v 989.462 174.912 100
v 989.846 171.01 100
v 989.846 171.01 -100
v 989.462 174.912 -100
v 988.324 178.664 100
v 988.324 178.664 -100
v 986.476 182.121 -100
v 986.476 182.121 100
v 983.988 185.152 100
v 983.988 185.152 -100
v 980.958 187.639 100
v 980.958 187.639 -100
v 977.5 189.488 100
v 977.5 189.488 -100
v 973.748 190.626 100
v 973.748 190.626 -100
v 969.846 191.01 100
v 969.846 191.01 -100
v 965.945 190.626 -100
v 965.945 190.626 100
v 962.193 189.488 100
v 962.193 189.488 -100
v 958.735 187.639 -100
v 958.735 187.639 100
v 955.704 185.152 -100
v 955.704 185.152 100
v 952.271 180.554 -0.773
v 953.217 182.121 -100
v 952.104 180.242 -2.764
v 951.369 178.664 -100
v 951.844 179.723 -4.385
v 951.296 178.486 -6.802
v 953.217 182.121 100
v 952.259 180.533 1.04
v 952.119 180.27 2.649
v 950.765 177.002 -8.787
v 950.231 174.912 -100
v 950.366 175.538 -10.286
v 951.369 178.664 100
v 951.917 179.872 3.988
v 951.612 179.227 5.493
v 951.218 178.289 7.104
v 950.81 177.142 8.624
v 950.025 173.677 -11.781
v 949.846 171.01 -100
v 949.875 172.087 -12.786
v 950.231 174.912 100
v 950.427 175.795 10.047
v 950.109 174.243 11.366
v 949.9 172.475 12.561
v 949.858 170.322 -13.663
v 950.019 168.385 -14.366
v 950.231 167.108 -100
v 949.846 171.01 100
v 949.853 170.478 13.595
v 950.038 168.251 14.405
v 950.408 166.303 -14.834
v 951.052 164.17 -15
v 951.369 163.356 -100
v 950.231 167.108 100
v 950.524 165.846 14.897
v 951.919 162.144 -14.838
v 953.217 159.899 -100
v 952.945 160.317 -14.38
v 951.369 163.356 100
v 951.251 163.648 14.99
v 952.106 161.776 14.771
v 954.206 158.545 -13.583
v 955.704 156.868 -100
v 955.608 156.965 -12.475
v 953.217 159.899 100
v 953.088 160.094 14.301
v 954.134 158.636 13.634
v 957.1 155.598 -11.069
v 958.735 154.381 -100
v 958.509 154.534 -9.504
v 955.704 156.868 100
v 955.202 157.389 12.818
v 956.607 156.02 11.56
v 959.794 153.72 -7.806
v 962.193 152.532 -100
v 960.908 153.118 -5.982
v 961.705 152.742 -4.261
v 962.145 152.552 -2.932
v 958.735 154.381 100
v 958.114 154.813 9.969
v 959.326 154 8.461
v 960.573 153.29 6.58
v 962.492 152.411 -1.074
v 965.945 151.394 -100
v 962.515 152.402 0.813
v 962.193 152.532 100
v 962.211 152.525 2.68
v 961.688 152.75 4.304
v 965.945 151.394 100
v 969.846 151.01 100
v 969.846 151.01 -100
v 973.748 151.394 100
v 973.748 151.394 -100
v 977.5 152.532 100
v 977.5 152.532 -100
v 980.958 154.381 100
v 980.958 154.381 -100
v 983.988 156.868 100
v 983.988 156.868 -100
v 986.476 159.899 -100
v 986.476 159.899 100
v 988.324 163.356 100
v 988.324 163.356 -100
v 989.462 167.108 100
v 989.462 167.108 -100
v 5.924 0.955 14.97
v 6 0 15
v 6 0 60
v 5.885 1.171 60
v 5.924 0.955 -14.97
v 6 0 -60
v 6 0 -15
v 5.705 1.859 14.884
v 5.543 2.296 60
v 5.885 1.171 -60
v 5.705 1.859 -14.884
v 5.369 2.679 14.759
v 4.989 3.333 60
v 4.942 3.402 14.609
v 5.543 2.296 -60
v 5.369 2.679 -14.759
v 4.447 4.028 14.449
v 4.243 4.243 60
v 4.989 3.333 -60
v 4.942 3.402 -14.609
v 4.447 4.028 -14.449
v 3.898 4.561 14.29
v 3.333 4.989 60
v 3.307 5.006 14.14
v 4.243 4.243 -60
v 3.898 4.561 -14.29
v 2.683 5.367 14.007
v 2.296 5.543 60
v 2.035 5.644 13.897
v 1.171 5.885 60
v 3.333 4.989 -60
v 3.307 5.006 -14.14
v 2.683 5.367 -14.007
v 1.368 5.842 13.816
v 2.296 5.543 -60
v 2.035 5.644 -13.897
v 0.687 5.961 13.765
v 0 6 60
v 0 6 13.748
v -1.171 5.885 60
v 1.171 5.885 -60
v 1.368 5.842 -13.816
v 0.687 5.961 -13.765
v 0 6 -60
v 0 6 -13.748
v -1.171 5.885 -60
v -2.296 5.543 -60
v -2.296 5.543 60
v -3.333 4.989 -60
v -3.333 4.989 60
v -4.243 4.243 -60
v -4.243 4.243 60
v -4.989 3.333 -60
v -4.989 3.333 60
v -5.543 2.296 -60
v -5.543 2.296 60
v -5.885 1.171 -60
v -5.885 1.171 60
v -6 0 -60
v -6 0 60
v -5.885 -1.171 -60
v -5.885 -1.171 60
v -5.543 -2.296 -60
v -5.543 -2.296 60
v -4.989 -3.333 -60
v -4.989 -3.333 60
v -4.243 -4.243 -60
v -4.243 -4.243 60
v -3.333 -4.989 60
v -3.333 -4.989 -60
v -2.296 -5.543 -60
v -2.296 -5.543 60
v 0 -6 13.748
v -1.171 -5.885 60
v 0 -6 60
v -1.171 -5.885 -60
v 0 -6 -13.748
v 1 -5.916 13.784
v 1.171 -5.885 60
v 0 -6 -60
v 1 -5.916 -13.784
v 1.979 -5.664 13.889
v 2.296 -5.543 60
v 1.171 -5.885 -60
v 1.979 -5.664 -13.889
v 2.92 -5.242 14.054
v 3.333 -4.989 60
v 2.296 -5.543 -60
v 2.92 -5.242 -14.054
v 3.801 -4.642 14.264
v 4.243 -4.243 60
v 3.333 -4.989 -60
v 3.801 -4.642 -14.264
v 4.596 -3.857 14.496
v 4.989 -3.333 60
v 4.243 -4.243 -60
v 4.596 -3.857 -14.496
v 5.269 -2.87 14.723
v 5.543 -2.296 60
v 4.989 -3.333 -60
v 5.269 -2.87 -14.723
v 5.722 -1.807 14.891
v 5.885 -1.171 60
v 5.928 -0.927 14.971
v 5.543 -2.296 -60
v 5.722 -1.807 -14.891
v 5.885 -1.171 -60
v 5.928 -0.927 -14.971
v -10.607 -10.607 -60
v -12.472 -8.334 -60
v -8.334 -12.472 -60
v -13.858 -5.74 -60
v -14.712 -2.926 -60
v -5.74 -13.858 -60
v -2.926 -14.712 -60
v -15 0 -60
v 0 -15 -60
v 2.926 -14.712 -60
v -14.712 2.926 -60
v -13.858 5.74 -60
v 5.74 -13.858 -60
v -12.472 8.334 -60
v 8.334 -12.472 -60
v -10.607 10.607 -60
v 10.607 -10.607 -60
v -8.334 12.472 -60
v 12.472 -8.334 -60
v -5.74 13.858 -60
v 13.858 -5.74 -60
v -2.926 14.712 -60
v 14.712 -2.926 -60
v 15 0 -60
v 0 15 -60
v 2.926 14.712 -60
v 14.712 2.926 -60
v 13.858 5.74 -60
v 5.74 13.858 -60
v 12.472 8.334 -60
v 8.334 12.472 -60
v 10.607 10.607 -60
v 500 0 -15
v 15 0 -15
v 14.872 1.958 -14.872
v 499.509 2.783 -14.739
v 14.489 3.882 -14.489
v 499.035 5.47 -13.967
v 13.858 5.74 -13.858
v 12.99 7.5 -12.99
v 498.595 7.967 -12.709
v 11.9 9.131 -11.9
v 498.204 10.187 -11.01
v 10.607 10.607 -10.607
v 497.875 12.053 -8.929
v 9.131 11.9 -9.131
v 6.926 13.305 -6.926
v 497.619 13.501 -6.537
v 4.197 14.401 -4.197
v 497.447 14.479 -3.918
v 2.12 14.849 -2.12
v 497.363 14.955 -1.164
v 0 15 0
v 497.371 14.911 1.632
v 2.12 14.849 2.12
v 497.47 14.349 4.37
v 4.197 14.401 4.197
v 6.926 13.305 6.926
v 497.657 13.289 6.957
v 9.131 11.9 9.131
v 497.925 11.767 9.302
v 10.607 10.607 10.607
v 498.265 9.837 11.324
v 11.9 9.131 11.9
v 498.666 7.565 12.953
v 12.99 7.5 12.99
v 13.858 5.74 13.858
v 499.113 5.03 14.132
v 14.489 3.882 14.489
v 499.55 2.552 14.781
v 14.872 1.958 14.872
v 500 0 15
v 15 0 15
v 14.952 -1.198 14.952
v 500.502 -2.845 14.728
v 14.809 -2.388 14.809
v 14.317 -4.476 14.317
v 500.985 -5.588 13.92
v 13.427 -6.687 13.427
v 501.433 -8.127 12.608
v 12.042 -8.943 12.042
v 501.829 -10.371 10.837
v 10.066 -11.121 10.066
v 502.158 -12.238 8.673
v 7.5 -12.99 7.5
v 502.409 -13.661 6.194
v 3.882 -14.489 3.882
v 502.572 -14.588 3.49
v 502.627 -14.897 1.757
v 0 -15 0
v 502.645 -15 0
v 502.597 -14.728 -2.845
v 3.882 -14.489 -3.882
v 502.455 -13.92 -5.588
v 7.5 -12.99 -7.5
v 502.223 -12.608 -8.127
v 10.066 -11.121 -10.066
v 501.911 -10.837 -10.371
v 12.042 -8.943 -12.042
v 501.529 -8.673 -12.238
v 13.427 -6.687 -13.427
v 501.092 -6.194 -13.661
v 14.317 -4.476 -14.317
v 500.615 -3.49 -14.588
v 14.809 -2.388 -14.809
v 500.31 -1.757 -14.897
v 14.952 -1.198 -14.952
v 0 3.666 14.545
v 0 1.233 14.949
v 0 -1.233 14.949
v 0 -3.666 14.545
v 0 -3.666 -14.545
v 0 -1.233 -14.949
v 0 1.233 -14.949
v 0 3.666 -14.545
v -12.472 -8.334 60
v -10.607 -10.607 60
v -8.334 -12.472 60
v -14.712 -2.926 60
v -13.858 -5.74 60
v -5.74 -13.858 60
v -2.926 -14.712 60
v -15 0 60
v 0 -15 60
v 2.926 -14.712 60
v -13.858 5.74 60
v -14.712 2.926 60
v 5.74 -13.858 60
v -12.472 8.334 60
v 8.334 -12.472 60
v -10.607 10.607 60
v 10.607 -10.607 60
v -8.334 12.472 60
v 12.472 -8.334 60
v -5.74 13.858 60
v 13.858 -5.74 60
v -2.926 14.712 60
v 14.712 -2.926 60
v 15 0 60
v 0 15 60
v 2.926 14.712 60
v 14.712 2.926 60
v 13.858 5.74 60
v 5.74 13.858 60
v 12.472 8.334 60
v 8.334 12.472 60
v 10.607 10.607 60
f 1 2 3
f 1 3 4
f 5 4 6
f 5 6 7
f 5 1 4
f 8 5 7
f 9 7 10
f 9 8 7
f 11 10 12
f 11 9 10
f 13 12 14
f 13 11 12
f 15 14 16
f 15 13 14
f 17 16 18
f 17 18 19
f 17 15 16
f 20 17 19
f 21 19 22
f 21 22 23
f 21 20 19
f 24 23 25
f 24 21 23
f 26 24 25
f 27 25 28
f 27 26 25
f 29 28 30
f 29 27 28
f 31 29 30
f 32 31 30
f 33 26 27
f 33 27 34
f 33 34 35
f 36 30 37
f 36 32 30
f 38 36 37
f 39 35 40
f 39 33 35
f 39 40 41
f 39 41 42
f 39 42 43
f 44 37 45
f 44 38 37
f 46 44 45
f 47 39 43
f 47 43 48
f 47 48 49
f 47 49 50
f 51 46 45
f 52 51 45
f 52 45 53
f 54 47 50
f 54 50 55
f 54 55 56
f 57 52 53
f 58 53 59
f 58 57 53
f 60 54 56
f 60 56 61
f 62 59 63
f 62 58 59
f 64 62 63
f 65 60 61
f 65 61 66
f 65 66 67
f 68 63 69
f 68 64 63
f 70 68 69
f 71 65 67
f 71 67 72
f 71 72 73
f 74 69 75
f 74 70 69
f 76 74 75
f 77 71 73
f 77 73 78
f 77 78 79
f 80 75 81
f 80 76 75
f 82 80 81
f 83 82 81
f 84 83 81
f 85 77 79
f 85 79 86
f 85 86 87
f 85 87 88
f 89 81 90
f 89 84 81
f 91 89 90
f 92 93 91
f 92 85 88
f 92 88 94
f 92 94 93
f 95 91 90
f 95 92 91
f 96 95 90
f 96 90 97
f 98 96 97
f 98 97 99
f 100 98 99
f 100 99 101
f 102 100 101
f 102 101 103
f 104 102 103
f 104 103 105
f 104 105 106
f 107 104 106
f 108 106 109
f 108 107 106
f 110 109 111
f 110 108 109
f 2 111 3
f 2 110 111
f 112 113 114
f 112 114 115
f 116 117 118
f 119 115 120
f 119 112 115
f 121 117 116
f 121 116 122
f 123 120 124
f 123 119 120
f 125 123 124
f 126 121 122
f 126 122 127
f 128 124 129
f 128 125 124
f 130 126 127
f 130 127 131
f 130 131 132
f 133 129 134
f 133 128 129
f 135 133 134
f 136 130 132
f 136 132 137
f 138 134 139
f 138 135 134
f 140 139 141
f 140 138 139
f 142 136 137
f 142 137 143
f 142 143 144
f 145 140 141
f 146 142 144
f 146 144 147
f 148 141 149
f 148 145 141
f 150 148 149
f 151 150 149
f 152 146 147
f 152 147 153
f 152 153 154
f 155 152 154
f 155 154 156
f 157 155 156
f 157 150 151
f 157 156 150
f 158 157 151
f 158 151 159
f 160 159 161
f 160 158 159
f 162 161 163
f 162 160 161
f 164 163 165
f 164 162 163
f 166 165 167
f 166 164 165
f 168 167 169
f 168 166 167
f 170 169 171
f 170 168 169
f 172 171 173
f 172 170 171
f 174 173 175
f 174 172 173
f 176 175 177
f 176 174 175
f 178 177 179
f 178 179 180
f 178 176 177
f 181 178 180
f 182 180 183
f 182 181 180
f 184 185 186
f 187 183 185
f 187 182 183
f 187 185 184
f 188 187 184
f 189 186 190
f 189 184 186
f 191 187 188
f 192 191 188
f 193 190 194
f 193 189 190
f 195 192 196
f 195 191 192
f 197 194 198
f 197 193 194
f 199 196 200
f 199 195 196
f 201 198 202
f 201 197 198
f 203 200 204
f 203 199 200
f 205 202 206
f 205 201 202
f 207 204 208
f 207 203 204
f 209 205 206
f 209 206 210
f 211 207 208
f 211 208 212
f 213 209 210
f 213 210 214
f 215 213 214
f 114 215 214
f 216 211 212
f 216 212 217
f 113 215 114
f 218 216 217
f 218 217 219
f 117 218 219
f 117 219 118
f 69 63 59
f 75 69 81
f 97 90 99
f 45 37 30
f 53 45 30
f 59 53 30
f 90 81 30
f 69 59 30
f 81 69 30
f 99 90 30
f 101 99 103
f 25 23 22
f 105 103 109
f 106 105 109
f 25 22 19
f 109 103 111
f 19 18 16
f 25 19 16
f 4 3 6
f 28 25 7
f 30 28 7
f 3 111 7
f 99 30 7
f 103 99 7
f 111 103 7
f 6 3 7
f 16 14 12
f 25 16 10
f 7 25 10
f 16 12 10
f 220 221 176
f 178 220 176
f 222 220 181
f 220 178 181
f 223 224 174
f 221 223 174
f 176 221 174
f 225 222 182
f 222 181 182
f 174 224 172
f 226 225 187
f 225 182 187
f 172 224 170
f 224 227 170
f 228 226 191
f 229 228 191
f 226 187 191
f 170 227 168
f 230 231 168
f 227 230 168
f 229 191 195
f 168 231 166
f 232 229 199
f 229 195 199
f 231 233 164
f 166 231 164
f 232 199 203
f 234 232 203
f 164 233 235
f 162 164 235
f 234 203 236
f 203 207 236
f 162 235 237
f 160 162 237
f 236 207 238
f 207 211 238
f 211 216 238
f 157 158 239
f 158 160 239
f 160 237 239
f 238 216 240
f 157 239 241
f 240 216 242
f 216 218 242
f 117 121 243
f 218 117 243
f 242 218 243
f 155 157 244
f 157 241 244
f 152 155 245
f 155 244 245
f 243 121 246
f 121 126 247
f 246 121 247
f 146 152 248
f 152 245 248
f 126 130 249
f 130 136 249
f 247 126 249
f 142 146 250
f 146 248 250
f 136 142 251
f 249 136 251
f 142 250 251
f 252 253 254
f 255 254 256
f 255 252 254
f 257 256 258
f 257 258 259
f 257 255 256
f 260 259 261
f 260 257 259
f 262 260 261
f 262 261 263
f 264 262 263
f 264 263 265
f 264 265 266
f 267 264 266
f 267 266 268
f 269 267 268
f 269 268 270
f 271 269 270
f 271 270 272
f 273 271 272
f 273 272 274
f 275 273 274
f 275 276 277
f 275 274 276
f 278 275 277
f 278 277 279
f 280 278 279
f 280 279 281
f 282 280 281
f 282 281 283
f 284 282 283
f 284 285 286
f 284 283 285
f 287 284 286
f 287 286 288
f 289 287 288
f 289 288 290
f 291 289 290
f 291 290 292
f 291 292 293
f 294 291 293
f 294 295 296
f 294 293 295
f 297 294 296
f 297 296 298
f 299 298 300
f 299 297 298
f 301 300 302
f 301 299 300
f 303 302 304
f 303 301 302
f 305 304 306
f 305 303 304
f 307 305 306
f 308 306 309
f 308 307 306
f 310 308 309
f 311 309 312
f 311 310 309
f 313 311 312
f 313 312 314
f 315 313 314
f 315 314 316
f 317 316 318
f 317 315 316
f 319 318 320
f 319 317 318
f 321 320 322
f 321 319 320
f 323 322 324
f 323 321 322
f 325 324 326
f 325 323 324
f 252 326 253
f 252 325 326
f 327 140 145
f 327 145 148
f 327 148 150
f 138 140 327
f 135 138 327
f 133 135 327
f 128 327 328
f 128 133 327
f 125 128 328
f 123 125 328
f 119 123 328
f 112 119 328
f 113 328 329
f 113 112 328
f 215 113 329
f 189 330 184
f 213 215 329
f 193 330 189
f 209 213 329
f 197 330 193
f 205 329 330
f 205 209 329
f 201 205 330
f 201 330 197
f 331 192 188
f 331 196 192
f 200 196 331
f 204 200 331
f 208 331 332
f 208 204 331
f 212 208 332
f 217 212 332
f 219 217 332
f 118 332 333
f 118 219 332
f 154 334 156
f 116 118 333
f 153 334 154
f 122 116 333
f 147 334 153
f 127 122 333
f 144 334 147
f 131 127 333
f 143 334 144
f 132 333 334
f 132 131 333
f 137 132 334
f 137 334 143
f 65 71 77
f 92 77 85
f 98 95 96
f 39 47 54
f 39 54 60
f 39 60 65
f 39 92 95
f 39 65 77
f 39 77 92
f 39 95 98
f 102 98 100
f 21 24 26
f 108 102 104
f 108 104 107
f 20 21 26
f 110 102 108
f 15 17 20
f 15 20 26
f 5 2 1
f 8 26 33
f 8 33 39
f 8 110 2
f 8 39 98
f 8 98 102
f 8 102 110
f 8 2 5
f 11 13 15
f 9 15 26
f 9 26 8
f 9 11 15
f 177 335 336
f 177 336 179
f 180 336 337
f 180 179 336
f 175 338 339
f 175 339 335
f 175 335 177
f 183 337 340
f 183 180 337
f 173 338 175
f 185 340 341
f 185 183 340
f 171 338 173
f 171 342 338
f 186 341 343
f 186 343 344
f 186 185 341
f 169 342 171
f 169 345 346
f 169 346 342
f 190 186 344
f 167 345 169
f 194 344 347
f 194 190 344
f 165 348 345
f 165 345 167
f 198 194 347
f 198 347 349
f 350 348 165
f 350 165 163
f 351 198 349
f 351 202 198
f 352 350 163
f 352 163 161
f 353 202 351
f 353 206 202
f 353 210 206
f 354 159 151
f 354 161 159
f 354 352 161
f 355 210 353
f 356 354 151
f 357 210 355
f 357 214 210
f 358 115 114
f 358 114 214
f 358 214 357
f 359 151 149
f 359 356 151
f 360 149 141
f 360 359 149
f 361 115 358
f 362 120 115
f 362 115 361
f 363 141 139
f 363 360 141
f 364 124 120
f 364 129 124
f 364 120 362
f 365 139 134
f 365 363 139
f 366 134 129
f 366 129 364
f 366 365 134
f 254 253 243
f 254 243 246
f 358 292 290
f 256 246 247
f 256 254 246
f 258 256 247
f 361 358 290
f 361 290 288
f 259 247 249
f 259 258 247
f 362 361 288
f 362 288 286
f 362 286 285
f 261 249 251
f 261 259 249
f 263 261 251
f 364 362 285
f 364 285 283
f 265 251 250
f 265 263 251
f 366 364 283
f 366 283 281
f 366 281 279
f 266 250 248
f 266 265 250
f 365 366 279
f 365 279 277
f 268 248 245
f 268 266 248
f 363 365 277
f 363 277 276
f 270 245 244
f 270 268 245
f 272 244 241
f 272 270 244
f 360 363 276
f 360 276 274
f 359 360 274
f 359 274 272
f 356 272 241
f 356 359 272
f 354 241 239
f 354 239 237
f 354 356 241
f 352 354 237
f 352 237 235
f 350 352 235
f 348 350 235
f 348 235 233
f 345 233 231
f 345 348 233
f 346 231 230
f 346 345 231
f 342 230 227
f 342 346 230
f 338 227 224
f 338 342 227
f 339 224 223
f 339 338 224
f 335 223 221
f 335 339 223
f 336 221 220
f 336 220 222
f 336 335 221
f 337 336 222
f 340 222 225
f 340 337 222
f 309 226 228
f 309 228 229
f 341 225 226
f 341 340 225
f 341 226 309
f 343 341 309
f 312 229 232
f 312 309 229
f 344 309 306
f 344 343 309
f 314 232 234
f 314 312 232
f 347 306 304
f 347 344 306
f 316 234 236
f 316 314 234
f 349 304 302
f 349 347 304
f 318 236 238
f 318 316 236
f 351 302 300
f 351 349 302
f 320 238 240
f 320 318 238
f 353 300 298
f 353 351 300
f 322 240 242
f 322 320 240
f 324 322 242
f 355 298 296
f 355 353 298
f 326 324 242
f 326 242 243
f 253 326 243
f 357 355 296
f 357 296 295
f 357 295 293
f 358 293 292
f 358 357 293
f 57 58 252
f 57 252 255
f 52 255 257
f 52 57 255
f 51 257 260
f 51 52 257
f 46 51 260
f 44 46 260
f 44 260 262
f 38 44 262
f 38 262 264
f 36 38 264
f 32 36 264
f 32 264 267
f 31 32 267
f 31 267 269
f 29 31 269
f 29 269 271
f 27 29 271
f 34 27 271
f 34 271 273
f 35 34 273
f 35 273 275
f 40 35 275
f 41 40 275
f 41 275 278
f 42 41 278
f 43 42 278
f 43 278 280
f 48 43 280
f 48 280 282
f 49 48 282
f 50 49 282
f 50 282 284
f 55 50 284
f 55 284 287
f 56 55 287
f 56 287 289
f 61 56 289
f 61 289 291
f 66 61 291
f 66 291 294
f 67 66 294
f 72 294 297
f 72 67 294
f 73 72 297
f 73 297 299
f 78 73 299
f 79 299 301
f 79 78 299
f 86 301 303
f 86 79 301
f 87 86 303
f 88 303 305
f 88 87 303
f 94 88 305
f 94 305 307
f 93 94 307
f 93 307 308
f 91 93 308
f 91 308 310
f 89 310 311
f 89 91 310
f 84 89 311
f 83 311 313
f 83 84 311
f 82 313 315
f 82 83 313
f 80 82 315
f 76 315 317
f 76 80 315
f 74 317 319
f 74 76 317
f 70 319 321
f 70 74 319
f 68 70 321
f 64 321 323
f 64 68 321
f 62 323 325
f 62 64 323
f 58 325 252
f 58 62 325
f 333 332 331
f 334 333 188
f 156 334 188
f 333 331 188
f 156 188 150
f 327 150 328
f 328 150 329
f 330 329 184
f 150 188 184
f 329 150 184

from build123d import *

# Parameters (mm, degrees)
SKETCH1_R           = 15
SKETCH1_R_2         = 6
BOSS_EXTRUDE1_DEPTH = 60
SKETCH2_R           = 15
SKETCH5_R           = 20
BOSS_EXTRUDE2_DEPTH = 100


with BuildPart() as part:
    # Sketch1 → Boss-Extrude1 (new, symmetric)
    with BuildSketch(Plane.XY):
        Circle(SKETCH1_R)
        Circle(SKETCH1_R_2, mode=Mode.SUBTRACT)
    extrude(amount=BOSS_EXTRUDE1_DEPTH, both=True)

    # Sweep1: sweep along a path in Sketch3
    with BuildLine(Plane.XY) as sweep1_path:
        Line((0, 0), (500, 0))
        Line((500, 0), (969.846310393, 171.010071663))
    # Sketch2 → Sweep1 (sweep)
    with BuildSketch(Plane(origin=(0, 0, 0), x_dir=(0, 0, -1), z_dir=(1, 0, 0))):
        Circle(SKETCH2_R)
    sweep(path=sweep1_path.line, transition=Transition.RIGHT)

    # Sketch5 → Boss-Extrude2 (add, symmetric)
    with BuildSketch(Plane.XY):
        with Locations((969.846310393, 171.010071663)):
            Circle(SKETCH5_R)
    extrude(amount=BOSS_EXTRUDE2_DEPTH, both=True)


solid = part.part
